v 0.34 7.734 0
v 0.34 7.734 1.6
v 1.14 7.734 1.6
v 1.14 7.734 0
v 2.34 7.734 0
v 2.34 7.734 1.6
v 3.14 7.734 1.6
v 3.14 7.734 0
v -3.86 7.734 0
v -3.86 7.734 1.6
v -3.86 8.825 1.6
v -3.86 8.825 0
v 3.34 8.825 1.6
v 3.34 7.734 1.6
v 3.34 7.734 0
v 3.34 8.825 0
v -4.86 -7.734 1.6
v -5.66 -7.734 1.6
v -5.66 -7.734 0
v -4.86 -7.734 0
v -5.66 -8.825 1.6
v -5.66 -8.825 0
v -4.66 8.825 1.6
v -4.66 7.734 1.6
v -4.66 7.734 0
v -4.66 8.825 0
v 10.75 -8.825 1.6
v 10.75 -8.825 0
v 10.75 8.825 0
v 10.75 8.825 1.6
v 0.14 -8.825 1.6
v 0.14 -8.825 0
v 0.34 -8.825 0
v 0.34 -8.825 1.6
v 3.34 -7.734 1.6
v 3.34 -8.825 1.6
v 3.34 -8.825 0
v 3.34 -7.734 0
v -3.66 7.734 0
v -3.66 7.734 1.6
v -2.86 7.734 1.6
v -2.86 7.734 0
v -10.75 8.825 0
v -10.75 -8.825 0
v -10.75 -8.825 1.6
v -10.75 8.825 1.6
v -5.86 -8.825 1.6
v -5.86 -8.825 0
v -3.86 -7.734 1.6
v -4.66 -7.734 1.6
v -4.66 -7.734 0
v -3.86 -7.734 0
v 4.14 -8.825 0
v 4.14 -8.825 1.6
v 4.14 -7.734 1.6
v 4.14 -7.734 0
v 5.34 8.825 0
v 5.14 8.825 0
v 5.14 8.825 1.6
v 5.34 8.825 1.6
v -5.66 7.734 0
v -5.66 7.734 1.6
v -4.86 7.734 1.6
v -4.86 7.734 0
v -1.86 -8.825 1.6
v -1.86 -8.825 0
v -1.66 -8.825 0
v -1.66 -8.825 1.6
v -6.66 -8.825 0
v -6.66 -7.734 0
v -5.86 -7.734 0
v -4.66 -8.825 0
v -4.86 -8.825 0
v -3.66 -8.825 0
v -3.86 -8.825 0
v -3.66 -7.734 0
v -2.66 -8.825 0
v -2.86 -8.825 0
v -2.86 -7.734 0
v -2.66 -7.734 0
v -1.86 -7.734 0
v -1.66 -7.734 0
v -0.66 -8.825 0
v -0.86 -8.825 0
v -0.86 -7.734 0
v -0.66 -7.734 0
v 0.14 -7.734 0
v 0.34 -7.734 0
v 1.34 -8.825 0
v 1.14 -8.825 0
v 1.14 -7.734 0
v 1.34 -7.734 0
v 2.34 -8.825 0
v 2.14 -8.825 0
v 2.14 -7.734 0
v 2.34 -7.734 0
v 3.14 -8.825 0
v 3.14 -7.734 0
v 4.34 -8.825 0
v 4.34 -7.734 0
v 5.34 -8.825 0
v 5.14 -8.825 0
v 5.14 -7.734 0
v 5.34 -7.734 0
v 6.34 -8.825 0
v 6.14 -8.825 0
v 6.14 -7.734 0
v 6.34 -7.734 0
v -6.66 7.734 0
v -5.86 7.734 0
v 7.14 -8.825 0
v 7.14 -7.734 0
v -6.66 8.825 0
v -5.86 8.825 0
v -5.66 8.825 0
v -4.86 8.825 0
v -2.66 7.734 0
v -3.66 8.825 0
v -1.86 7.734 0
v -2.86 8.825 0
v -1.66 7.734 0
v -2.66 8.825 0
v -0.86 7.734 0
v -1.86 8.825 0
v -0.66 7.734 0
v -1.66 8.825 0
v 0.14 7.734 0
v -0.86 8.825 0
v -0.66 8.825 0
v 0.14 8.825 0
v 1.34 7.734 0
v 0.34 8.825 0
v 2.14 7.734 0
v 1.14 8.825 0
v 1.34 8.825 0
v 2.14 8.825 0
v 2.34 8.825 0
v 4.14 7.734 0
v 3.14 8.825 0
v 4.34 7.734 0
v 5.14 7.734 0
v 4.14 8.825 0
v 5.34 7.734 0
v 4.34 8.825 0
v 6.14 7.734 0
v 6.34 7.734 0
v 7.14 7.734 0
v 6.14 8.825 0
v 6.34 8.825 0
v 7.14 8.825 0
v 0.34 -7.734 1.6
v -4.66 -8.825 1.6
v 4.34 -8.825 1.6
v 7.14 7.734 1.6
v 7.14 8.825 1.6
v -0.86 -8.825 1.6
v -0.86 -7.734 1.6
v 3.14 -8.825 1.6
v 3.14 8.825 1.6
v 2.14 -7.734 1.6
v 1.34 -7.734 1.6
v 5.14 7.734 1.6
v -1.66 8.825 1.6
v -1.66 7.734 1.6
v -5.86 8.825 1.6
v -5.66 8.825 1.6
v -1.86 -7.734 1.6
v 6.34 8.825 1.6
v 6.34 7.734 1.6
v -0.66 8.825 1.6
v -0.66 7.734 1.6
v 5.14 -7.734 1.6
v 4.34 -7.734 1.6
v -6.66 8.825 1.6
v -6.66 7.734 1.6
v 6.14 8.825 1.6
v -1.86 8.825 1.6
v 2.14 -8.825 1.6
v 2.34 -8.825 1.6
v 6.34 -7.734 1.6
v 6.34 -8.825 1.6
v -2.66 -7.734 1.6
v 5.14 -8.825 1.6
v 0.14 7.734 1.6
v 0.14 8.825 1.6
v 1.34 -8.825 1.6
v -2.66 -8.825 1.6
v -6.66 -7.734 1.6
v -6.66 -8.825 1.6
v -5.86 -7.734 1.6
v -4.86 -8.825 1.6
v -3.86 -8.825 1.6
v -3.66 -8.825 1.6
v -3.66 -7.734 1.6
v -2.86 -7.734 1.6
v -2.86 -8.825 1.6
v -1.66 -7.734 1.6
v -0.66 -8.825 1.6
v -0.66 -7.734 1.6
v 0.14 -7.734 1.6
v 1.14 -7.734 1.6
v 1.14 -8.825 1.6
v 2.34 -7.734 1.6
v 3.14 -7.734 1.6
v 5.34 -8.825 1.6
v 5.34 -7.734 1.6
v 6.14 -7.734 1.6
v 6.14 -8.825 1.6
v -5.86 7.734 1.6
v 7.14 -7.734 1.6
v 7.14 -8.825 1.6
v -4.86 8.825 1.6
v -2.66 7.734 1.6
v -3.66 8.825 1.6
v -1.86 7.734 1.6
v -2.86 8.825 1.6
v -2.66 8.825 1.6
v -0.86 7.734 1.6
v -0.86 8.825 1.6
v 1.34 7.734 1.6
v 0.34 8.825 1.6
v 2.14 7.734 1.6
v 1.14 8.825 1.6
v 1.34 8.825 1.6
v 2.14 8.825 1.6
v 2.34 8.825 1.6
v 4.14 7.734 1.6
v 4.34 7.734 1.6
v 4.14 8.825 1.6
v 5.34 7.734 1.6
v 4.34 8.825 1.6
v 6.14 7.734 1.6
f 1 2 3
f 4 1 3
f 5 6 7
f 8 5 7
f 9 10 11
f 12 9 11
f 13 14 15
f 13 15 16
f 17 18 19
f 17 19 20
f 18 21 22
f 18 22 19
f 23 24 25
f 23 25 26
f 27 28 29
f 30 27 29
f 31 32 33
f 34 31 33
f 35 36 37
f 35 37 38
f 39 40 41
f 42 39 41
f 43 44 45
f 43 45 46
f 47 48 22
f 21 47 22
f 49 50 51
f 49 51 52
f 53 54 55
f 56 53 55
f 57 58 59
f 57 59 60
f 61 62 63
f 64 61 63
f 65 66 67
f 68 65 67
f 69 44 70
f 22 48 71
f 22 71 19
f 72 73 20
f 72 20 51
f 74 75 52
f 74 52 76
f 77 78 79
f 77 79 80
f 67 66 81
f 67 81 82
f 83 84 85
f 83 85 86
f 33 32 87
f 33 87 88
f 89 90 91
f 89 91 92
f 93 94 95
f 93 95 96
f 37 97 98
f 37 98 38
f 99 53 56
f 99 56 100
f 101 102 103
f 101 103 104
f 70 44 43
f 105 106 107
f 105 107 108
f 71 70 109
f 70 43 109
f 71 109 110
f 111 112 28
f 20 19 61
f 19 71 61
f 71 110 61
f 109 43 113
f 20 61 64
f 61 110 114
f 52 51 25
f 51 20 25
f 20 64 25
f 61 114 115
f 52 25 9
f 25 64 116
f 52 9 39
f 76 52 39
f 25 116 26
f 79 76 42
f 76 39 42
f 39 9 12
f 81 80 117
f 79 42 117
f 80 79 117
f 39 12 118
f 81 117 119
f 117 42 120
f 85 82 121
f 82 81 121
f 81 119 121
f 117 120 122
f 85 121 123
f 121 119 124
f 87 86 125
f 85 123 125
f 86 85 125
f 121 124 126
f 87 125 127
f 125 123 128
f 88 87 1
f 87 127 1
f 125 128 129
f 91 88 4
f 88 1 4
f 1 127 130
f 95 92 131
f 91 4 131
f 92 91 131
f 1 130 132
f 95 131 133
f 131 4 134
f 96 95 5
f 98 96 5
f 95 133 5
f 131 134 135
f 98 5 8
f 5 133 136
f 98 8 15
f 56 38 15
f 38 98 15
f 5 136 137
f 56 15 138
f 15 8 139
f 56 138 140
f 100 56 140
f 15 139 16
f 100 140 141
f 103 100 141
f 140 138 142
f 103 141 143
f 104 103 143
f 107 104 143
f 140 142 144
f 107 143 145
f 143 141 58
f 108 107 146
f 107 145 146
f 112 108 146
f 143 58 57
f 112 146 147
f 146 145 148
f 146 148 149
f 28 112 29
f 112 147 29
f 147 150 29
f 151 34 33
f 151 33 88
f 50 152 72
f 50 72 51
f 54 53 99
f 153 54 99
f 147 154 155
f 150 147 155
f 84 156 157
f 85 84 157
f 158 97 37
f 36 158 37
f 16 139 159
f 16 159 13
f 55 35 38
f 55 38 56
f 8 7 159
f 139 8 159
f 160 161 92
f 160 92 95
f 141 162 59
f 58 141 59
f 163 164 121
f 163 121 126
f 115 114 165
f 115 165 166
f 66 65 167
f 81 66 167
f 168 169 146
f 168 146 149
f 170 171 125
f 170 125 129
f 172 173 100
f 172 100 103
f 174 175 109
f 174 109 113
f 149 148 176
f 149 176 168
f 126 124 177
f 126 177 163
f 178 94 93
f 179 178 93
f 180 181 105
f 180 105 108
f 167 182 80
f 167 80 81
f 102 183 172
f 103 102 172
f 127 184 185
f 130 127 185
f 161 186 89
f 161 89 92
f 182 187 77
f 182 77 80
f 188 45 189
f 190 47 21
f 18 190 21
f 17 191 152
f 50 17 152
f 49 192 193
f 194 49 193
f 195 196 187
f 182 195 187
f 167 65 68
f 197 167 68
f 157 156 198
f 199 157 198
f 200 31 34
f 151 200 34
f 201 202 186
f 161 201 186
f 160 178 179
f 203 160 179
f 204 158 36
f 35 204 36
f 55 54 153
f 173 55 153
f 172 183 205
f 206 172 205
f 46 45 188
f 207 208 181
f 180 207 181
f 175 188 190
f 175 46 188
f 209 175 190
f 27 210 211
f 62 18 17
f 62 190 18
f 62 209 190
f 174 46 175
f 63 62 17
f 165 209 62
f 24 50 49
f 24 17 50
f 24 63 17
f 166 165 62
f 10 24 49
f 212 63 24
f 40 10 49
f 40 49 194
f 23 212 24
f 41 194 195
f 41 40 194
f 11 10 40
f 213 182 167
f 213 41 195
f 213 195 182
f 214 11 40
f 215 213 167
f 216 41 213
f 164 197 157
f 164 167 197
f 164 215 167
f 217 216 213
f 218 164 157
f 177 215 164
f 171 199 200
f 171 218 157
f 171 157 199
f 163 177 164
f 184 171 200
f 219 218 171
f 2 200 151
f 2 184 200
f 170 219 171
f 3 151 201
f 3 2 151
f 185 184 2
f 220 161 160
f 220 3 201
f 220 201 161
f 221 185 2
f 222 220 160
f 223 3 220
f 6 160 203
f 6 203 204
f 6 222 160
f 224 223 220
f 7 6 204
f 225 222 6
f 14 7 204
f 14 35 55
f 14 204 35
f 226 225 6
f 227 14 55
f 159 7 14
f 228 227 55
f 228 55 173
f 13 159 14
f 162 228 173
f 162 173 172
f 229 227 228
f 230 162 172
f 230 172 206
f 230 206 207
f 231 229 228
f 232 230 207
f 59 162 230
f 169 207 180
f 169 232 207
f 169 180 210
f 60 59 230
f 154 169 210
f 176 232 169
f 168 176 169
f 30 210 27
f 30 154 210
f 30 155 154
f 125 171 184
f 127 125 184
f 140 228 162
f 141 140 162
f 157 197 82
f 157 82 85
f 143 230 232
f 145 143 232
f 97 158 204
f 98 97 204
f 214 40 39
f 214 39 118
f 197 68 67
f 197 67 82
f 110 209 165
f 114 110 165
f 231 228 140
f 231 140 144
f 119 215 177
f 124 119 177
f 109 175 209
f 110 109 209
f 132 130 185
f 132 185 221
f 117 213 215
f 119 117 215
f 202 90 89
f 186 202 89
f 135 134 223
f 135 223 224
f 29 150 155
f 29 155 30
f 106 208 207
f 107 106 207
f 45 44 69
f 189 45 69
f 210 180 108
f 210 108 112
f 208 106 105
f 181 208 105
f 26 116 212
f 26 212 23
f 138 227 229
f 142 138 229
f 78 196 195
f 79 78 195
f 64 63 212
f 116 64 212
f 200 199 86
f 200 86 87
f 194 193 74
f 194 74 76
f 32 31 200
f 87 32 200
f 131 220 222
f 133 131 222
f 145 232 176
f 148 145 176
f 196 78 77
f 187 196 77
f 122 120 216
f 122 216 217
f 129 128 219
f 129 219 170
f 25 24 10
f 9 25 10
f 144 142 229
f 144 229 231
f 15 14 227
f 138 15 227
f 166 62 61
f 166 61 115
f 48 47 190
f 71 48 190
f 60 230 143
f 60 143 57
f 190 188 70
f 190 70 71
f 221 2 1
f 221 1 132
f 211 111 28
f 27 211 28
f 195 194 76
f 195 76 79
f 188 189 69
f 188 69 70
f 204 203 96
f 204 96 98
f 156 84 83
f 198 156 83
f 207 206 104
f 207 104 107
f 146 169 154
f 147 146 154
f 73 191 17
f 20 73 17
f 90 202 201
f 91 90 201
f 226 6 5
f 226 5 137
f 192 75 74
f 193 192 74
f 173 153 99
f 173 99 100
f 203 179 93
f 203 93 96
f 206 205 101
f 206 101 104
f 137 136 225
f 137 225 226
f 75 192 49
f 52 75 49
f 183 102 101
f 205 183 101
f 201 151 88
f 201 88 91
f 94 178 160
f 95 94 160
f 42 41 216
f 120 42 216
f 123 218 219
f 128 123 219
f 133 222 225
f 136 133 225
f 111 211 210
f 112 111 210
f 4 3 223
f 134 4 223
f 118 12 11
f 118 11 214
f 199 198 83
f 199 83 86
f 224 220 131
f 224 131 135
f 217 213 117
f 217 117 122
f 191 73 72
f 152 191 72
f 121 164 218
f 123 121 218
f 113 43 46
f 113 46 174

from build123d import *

# Parameters (mm, degrees)
F0_W     = 21.5
F0_H     = 17.65
F1_DEPTH = 1.6
F3_W     = 0.8
F3_H     = 1.0909089439
F4_DEPTH = 25


with BuildPart() as f1:
    # F0 (on Top) → F1 (new body)
    with BuildSketch(Plane.XY):
        Rectangle(F0_W, F0_H)
    extrude(amount=F1_DEPTH)

    # F3 (on offset) → F4 (cut)
    with BuildSketch(Plane.XY.offset(1.635)):
        with Locations((-6.26, 8.279545528)):
            Rectangle(F3_W, F3_H)
        with Locations((-5.26, 8.279545528)):
            Rectangle(F3_W, F3_H)
        with Locations((-4.26, 8.279545528)):
            Rectangle(F3_W, F3_H)
        with Locations((-3.26, 8.279545528)):
            Rectangle(F3_W, F3_H)
        with Locations((-2.26, 8.279545528)):
            Rectangle(F3_W, F3_H)
        with Locations((-1.26, 8.279545528)):
            Rectangle(F3_W, F3_H)
        with Locations((-0.26, 8.279545528)):
            Rectangle(F3_W, F3_H)
        with Locations((0.74, 8.279545528)):
            Rectangle(F3_W, F3_H)
        with Locations((1.74, 8.279545528)):
            Rectangle(F3_W, F3_H)
        with Locations((2.74, 8.279545528)):
            Rectangle(F3_W, F3_H)
        with Locations((3.74, 8.279545528)):
            Rectangle(F3_W, F3_H)
        with Locations((4.74, 8.279545528)):
            Rectangle(F3_W, F3_H)
        with Locations((5.74, 8.279545528)):
            Rectangle(F3_W, F3_H)
        with Locations((6.74, 8.279545528)):
            Rectangle(F3_W, F3_H)
        with Locations((-6.26, -8.279545528)):
            Rectangle(F3_W, F3_H)
        with Locations((3.74, -8.279545528)):
            Rectangle(F3_W, F3_H)
        with Locations((6.74, -8.279545528)):
            Rectangle(F3_W, F3_H)
        with Locations((-1.26, -8.279545528)):
            Rectangle(F3_W, F3_H)
        with Locations((1.74, -8.279545528)):
            Rectangle(F3_W, F3_H)
        with Locations((4.74, -8.279545528)):
            Rectangle(F3_W, F3_H)
        with Locations((-4.26, -8.279545528)):
            Rectangle(F3_W, F3_H)
        with Locations((-5.26, -8.279545528)):
            Rectangle(F3_W, F3_H)
        with Locations((5.74, -8.279545528)):
            Rectangle(F3_W, F3_H)
        with Locations((0.74, -8.279545528)):
            Rectangle(F3_W, F3_H)
        with Locations((-3.26, -8.279545528)):
            Rectangle(F3_W, F3_H)
        with Locations((-0.26, -8.279545528)):
            Rectangle(F3_W, F3_H)
        with Locations((-2.26, -8.279545528)):
            Rectangle(F3_W, F3_H)
        with Locations((2.74, -8.279545528)):
            Rectangle(F3_W, F3_H)
    extrude(amount=-F4_DEPTH, mode=Mode.SUBTRACT)


solid = f1.part
